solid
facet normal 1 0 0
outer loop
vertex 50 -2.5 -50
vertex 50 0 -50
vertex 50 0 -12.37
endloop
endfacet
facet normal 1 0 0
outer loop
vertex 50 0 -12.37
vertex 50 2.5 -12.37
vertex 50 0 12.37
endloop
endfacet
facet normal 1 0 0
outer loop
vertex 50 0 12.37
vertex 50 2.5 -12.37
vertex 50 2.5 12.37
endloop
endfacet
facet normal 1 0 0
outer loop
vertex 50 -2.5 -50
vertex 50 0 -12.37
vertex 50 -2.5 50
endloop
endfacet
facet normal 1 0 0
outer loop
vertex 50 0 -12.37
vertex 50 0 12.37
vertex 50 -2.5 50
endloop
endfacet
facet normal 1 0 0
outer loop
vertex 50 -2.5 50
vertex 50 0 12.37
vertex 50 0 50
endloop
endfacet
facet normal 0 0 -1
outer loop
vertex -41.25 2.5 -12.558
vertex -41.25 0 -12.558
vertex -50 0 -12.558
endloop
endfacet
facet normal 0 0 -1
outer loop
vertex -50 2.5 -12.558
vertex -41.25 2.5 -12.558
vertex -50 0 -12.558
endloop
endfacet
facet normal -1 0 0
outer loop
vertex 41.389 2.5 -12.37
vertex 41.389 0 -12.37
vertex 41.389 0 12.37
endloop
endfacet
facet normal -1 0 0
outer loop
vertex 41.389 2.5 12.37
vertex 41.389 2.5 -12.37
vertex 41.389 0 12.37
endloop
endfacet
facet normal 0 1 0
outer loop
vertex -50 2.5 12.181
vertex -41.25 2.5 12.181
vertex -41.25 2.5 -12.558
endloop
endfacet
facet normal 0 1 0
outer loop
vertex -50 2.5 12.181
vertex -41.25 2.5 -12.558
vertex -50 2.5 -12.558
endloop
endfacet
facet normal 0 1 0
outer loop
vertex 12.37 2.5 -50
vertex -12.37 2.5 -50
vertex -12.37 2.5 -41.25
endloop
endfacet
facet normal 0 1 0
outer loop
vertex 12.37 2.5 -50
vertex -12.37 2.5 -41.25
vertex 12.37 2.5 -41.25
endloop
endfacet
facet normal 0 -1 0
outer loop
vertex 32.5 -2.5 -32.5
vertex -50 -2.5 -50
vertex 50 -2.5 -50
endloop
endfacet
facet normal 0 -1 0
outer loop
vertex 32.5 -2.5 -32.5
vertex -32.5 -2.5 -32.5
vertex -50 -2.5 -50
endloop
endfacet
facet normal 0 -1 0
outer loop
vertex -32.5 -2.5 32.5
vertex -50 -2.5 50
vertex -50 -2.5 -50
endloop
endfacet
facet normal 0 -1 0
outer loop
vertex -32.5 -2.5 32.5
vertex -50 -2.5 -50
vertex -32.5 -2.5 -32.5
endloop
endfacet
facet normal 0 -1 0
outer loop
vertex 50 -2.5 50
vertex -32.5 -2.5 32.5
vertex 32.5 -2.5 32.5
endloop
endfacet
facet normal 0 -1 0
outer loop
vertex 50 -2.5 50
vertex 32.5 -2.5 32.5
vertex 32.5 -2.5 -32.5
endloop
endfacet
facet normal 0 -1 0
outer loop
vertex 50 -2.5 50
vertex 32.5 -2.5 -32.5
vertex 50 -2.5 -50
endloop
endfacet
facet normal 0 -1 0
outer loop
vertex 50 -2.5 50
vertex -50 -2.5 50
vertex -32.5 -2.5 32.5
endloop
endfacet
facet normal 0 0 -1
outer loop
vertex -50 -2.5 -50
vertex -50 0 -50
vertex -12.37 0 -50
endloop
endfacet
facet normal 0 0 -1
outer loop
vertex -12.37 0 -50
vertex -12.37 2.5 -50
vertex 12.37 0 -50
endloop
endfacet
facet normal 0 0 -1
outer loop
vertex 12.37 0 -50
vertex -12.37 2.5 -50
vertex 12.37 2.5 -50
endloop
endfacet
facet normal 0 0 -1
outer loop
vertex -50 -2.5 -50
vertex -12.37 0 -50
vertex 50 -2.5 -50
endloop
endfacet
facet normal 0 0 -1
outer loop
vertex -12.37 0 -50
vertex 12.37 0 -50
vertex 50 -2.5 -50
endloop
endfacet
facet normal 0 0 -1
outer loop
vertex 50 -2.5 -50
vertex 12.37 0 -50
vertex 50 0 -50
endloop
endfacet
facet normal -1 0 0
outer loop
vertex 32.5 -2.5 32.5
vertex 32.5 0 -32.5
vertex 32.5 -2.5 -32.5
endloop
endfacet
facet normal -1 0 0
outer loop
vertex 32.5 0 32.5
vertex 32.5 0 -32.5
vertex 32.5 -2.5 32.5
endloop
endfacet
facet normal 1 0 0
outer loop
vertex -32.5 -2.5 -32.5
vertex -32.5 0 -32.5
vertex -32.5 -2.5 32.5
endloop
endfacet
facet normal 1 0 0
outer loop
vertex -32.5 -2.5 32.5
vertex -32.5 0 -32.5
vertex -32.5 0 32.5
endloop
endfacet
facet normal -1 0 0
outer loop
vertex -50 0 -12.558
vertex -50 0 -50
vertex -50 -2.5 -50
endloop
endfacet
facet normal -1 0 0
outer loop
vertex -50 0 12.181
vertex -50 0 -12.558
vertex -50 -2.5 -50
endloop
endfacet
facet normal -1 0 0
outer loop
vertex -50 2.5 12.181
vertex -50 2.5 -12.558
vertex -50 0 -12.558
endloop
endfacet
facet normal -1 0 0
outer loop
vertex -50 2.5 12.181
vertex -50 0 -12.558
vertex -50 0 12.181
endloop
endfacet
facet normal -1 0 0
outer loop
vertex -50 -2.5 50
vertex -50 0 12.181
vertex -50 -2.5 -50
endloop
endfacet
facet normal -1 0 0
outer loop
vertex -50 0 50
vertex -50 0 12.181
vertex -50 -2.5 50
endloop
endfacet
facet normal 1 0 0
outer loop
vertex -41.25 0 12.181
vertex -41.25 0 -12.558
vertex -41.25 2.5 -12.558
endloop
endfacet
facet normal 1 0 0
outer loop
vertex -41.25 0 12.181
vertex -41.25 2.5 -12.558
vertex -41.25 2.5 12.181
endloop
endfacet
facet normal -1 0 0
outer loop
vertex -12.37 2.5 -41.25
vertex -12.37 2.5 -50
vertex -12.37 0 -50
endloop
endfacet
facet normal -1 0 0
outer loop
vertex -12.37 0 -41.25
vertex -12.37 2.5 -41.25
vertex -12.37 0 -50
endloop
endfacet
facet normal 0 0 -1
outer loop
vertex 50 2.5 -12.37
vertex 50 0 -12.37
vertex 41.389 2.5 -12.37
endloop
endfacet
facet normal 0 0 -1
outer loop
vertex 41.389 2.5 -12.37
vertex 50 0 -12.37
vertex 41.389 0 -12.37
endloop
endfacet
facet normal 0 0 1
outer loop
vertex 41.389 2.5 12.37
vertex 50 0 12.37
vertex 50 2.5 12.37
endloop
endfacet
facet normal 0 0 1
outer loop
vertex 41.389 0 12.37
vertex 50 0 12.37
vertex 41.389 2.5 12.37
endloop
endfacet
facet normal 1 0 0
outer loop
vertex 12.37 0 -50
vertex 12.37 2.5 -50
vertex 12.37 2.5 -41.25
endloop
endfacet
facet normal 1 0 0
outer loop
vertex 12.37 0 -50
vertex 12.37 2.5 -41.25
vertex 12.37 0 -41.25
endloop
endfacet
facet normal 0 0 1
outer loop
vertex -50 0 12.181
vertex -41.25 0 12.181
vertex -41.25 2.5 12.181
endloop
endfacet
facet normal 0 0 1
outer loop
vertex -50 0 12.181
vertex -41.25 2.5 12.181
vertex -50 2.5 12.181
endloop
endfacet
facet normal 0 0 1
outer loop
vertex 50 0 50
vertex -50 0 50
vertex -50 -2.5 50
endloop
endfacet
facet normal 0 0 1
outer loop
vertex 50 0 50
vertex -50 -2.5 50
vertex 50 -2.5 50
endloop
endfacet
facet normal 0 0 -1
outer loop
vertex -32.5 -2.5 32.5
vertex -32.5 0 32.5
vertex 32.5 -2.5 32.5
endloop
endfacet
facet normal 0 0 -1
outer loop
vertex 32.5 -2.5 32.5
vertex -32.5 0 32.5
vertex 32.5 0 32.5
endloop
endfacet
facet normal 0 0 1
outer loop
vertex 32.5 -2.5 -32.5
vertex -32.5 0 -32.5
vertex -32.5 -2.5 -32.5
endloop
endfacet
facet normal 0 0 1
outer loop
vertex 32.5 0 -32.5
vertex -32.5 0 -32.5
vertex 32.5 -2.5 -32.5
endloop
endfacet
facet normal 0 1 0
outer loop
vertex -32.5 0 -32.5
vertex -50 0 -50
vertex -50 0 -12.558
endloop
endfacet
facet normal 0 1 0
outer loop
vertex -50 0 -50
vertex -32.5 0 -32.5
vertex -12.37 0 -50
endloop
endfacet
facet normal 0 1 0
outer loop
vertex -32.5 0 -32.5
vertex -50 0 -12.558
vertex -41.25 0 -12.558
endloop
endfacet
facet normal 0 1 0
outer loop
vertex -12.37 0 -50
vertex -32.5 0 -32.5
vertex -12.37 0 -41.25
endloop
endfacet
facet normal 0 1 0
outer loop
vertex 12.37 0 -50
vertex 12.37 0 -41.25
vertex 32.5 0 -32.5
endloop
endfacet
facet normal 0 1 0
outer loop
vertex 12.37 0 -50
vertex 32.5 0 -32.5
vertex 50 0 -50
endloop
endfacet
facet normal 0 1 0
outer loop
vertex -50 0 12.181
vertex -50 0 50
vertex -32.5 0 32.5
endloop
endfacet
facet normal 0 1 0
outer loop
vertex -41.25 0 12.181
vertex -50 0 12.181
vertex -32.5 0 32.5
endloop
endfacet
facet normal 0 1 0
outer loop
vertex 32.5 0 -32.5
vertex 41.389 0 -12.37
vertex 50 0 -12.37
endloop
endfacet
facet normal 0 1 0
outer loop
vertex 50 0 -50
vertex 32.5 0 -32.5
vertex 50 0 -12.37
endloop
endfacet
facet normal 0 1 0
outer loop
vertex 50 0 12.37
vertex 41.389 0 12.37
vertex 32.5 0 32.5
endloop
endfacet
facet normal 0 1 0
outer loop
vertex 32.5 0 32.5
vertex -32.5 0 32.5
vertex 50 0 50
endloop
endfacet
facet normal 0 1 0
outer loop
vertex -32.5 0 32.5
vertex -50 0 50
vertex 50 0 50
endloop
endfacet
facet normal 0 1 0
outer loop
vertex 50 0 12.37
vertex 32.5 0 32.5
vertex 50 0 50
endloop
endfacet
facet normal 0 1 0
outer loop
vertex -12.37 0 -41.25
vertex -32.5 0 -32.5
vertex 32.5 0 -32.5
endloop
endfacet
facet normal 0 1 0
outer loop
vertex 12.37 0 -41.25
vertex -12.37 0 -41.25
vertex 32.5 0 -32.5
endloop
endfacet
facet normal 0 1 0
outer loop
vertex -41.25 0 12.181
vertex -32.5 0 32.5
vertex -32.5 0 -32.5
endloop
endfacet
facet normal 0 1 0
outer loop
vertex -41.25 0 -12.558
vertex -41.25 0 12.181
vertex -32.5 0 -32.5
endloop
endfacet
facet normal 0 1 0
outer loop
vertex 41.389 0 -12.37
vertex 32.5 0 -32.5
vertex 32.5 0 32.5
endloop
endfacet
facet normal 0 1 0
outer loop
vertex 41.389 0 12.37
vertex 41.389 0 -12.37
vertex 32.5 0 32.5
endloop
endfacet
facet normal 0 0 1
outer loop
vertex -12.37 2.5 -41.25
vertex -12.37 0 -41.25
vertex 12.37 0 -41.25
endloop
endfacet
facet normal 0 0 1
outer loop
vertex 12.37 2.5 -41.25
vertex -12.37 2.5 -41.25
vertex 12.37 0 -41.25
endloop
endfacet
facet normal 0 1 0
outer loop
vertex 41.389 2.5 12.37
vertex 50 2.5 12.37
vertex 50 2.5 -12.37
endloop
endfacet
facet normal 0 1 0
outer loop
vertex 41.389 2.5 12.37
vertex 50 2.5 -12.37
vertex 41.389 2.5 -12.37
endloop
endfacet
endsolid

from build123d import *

# Parameters (mm, degrees)
F0_W     = 100
F0_H     = 100
F0_W_2   = 65
F0_H_2   = 65
F1_DEPTH = 2.5
F2_W     = 8.75
F2_H     = 24.739
F3_DEPTH = 2.5
F4_W     = 8.61061
F4_H     = 24.739
F5_DEPTH = 2.5
F6_W     = 24.739
F6_H     = 2.5
F7_DEPTH = 8.75


with BuildPart() as f1:
    # F0 (on Front) → F1 (new body)
    with BuildSketch(Plane.XZ):
        Rectangle(F0_W, F0_H)
        Rectangle(F0_W_2, F0_H_2, mode=Mode.SUBTRACT)
    extrude(amount=F1_DEPTH)

    # F2 (on face) → F3 (join)
    with BuildSketch(Plane(origin=(0, 0, 0), x_dir=(-1, 0, 0), z_dir=(0, 1, 0))):
        with Locations((45.625, -0.188954)):
            Rectangle(F2_W, F2_H)
    extrude(amount=F3_DEPTH)

    # F4 (on face) → F5 (join)
    with BuildSketch(Plane(origin=(0, 0, 0), x_dir=(-1, 0, 0), z_dir=(0, 1, 0))):
        with Locations((-45.694695, 0)):
            Rectangle(F4_W, F4_H)
    extrude(amount=F5_DEPTH)

    # F6 (on face) → F7 (join)
    with BuildSketch(Plane(origin=(0, 0, -50), x_dir=(1, 0, 0), z_dir=(0, 0, -1))):
        with Locations((0, -1.25)):
            Rectangle(F6_W, F6_H)
    extrude(amount=-F7_DEPTH)


solid = f1.part
